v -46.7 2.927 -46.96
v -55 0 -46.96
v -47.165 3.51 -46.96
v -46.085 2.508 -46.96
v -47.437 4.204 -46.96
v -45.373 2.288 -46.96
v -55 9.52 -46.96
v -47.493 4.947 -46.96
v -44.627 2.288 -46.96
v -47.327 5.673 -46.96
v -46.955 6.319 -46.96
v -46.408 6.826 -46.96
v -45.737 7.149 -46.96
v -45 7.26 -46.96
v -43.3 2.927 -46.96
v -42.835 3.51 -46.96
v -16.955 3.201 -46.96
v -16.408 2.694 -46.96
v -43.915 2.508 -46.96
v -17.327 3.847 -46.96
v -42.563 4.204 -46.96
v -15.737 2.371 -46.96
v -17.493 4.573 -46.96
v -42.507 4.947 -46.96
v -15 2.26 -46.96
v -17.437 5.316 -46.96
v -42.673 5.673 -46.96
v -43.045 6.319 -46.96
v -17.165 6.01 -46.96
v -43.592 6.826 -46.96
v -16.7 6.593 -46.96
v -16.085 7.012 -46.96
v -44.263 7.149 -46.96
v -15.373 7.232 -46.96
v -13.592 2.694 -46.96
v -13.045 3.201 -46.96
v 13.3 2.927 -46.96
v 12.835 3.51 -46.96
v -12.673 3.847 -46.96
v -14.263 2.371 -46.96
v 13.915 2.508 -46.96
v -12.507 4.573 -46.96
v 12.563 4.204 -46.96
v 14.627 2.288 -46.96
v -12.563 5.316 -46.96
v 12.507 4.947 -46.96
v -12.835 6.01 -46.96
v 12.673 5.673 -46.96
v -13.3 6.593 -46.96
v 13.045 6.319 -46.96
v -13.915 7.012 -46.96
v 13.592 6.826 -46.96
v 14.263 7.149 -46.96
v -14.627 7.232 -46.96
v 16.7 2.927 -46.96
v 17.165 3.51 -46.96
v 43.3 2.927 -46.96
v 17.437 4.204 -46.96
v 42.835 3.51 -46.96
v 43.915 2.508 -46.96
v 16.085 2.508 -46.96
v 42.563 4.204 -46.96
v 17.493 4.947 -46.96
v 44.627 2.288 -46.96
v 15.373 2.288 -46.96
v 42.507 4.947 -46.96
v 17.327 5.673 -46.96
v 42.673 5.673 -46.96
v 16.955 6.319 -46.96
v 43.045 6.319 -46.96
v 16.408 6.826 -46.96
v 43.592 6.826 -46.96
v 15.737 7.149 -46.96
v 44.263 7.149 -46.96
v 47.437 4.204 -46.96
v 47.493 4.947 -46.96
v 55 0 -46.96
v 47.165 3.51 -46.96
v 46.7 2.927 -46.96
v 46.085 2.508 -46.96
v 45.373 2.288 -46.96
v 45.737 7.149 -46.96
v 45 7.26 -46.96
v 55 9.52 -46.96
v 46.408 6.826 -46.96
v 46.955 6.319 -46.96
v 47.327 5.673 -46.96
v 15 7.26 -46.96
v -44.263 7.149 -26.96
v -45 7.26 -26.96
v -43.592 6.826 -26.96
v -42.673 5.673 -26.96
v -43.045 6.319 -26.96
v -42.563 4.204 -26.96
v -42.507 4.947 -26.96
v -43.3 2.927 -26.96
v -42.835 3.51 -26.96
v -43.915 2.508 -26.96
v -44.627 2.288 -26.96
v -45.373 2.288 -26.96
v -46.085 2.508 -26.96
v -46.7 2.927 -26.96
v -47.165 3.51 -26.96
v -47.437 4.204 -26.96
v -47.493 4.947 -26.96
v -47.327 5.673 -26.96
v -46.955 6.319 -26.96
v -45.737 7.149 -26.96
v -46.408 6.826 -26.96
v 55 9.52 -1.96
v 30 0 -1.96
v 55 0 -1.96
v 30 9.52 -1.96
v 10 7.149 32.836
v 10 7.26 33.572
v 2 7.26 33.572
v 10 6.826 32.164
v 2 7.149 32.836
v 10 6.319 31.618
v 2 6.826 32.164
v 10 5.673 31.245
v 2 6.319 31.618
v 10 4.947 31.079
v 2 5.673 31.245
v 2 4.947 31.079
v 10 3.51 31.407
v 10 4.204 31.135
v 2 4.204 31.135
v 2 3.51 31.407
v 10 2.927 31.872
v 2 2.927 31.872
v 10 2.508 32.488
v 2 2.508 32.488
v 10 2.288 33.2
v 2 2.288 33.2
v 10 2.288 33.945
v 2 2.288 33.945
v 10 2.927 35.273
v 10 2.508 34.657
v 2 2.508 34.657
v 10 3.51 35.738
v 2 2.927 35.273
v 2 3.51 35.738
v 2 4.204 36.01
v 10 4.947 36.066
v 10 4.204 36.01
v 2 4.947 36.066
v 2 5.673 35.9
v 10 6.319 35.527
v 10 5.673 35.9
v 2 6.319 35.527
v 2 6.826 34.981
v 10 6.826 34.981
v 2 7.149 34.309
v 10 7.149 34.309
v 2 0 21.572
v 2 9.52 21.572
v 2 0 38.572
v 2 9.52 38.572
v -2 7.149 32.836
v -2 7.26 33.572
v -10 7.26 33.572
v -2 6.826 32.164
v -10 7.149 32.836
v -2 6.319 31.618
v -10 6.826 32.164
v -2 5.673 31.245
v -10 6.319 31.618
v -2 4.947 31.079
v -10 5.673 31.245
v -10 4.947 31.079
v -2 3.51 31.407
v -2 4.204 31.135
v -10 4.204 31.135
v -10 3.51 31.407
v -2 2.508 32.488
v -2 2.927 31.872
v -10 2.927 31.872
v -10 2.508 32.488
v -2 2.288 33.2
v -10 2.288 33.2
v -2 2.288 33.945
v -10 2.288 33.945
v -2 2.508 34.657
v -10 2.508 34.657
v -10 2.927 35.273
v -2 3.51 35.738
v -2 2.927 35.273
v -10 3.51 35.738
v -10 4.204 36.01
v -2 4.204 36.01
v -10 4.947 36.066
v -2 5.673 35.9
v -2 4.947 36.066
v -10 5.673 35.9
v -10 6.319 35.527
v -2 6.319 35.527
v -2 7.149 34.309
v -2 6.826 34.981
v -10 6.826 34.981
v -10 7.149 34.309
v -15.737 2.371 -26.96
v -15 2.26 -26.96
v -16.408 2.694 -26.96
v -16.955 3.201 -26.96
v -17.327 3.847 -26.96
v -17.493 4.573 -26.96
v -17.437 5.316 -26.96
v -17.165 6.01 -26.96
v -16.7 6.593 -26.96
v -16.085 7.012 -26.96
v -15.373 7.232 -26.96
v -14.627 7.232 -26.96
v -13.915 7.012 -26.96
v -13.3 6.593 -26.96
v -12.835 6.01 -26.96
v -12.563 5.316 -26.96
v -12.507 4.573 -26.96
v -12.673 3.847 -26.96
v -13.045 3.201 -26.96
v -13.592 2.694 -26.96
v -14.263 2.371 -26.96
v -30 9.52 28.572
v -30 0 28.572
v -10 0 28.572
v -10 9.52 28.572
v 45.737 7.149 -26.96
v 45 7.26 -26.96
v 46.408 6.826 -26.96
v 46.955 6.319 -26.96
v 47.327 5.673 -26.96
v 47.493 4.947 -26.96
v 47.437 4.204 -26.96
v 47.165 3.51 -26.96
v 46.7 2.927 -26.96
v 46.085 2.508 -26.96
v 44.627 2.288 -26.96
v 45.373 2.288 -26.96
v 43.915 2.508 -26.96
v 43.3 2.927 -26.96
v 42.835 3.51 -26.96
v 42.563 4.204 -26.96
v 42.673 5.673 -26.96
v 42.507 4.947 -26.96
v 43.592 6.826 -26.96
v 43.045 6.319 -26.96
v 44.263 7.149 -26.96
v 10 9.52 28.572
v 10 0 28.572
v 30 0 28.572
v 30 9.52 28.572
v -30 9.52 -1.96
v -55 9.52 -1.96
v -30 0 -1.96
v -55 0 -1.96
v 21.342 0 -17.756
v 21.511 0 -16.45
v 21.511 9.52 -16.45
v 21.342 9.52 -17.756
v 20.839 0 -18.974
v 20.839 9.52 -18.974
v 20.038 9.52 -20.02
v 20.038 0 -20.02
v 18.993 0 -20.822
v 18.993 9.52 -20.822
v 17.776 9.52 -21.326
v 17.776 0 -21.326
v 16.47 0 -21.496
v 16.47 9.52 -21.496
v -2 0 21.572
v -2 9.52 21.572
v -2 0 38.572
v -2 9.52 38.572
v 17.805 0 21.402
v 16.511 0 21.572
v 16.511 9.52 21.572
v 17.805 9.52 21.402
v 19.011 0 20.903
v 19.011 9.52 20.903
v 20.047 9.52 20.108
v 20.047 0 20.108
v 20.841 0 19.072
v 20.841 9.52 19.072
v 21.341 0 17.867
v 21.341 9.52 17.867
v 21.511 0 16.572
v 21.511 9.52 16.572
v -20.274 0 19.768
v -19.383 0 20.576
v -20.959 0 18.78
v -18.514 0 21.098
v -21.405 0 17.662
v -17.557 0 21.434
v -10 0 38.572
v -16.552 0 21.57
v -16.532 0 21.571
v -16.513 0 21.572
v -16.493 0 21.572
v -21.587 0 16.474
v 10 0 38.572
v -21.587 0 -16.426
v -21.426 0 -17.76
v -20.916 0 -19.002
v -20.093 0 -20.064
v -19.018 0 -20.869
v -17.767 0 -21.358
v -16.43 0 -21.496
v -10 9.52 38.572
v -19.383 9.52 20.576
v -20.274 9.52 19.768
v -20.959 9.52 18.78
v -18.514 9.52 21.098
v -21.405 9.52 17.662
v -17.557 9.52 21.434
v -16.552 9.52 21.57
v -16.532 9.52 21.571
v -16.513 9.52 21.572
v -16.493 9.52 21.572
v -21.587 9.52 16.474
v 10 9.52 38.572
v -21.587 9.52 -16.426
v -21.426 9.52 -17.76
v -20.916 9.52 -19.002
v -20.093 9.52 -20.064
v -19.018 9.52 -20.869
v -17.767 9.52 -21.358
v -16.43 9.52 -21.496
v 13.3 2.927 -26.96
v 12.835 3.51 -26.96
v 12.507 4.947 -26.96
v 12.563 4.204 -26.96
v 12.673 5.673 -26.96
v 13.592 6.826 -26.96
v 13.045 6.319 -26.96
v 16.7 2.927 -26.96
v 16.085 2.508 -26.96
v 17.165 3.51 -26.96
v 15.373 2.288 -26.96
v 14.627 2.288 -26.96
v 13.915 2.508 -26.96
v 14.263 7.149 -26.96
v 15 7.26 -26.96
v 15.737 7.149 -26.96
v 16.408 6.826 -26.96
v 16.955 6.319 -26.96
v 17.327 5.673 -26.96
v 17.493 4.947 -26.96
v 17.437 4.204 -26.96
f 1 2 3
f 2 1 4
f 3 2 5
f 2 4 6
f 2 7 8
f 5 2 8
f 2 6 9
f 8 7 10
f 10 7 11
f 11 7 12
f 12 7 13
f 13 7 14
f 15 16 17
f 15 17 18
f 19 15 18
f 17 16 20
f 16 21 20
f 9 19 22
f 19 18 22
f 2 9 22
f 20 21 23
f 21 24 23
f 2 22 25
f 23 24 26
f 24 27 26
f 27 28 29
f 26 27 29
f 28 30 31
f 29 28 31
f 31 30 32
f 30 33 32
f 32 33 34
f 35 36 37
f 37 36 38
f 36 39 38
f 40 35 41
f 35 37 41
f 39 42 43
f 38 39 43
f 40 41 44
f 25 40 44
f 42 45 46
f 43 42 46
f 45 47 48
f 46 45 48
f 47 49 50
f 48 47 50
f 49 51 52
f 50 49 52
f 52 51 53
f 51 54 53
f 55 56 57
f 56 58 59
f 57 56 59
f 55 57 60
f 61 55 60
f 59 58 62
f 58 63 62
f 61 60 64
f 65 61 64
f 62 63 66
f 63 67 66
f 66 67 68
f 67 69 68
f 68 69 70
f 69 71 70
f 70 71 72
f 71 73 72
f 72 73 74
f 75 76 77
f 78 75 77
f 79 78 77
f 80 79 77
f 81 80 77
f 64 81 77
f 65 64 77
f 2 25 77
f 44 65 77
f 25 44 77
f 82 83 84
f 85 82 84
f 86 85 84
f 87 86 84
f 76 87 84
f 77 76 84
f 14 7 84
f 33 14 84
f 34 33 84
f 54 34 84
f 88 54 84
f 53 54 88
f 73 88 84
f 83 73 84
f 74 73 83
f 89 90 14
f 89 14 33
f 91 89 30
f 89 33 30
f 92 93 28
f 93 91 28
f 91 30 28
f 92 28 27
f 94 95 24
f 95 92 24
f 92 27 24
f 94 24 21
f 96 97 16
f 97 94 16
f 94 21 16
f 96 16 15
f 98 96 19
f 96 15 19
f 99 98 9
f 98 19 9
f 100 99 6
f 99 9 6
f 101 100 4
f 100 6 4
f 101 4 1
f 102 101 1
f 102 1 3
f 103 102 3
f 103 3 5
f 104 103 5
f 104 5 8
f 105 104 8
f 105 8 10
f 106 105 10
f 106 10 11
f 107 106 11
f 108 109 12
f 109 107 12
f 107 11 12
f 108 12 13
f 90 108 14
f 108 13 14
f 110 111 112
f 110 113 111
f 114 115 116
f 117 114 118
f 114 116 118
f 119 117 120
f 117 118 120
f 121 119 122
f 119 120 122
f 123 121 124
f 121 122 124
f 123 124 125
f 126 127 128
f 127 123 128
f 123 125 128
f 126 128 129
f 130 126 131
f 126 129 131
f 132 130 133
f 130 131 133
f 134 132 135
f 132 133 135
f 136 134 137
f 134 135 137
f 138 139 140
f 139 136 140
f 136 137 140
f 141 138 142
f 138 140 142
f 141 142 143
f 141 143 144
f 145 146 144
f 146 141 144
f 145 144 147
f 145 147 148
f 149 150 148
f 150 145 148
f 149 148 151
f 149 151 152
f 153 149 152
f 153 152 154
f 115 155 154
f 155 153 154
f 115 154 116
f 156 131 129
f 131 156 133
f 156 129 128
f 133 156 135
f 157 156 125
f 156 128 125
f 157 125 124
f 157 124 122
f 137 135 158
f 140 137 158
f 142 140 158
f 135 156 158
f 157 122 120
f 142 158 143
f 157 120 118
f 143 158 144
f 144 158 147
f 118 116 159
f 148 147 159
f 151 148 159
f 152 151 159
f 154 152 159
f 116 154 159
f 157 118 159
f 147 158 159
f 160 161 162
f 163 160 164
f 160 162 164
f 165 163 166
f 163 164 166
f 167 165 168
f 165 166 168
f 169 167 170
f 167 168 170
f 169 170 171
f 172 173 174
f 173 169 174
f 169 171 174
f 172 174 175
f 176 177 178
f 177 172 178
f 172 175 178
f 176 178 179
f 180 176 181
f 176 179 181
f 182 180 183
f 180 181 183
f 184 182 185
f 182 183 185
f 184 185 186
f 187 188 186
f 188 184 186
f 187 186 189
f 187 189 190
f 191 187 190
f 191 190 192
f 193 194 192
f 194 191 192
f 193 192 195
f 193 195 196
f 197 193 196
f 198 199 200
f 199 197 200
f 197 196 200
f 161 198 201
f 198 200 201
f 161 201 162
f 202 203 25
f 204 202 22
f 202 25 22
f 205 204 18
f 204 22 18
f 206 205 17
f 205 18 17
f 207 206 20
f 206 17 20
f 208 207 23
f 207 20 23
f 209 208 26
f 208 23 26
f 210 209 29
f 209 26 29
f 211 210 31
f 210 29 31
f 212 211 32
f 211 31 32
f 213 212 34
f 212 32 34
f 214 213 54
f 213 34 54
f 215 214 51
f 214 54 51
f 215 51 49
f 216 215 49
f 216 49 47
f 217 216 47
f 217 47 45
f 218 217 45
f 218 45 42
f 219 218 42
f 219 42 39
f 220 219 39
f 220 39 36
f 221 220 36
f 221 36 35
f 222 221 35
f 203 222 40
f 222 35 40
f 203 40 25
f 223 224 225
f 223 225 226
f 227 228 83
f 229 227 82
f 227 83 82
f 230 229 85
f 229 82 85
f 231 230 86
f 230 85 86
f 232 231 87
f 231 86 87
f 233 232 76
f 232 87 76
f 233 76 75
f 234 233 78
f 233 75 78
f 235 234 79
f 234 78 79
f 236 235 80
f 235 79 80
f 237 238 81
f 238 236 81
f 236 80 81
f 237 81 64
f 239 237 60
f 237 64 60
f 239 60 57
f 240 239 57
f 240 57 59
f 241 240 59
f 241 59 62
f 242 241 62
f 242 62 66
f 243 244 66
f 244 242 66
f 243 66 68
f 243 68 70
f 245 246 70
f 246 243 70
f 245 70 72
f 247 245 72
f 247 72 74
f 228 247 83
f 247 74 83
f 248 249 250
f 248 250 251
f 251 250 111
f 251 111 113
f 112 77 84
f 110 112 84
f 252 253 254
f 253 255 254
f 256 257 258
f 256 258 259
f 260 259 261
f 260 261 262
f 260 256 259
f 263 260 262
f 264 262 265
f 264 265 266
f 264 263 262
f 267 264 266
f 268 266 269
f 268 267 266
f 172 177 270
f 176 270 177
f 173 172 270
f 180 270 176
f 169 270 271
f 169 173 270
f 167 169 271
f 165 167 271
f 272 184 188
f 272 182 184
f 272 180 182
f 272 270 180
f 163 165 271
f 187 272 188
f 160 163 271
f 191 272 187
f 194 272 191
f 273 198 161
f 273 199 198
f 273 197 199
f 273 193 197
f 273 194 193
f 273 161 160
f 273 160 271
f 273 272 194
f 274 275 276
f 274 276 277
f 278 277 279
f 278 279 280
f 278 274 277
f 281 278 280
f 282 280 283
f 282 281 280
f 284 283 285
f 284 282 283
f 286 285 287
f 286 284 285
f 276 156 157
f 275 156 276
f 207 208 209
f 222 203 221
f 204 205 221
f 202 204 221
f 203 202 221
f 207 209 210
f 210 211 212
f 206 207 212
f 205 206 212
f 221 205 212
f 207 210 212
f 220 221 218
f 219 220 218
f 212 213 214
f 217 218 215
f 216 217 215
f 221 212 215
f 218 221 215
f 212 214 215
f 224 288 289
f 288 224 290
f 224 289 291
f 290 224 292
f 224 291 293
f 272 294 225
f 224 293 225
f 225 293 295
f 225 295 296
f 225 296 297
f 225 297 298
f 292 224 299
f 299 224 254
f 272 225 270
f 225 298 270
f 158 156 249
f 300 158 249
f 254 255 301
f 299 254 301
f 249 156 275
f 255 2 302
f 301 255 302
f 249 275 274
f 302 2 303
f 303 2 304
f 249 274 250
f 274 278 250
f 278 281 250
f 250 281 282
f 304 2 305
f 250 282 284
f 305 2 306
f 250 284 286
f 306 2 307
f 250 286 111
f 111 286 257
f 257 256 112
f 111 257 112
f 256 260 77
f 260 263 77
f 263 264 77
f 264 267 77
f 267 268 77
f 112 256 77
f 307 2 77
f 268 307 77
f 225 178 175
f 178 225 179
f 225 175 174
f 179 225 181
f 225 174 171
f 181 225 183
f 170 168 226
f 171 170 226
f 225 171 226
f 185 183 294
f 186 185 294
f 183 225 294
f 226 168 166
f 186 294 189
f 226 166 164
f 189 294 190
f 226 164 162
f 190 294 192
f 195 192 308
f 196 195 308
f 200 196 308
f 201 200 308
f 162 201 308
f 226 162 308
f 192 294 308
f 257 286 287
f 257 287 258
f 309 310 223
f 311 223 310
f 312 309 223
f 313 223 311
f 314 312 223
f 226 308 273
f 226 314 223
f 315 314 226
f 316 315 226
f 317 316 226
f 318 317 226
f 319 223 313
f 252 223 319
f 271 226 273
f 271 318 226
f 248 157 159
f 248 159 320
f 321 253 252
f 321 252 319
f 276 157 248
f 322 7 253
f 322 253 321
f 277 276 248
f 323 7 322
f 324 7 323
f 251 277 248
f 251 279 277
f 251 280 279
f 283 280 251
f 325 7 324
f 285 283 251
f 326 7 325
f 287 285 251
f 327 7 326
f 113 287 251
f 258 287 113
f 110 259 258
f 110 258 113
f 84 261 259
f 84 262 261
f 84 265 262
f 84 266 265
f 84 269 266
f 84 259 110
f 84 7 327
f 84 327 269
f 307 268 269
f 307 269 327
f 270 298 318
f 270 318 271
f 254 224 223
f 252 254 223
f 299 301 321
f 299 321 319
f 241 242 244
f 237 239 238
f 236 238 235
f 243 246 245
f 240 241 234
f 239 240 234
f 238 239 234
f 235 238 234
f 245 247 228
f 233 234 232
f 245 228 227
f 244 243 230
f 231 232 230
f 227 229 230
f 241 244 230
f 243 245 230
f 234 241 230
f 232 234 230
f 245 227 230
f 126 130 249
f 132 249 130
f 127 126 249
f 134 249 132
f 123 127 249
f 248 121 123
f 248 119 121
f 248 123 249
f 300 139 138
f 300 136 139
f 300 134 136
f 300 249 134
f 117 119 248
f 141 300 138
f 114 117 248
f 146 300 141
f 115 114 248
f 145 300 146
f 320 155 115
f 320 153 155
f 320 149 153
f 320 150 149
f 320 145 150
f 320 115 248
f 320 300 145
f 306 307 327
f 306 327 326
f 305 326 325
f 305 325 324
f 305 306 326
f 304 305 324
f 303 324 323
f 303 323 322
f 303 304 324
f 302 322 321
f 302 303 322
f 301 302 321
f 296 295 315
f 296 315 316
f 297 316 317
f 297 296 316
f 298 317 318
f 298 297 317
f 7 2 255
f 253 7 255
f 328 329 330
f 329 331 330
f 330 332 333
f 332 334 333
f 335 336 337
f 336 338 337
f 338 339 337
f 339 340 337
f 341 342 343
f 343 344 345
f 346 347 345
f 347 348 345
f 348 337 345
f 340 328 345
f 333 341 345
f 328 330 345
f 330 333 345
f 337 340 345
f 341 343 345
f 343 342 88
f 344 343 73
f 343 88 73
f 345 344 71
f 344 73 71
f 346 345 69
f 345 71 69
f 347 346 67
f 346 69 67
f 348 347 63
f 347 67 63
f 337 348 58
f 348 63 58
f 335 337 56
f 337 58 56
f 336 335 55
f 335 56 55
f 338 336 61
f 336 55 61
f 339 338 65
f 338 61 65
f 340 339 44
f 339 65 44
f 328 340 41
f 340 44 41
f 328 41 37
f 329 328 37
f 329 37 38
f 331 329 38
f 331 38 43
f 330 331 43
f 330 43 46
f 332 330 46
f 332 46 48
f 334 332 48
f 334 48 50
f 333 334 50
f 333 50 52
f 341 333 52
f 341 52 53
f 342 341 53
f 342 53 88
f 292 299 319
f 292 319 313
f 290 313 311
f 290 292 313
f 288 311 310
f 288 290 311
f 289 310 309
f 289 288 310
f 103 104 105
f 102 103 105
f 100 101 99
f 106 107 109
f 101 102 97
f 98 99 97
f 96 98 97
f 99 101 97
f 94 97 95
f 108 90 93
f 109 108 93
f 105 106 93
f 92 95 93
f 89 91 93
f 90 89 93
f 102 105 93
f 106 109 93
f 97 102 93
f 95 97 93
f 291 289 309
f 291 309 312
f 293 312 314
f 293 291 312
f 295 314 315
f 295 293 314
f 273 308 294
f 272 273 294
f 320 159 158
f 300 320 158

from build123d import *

# Parameters (mm, degrees)
ESBO_O1_W                    = 60
ESBO_O1_H                    = 50
RESSALTO_EXTRUS_O1_DEPTH     = 9.52
CORTE_EXTRUS_O1_DEPTH        = 9.52
CORTE_EXTRUS_O1_START        = 7.26
CORTE_EXTRUS_O1_2_DEPTH      = 2.26
CORTE_EXTRUS_O1_3_DEPTH      = 2.2599999
CORTE_EXTRUS_O1_START_2      = -30
CORTE_EXTRUS_O1_4_OUTLINE_W  = 5.0000001
CORTE_EXTRUS_O1_4_OUTLINE_H  = 3.572491942
CORTE_EXTRUS_O1_4_DEPTH      = 28
CORTE_EXTRUS_O1_START_3      = 2
CORTE_EXTRUS_O1_5_OUTLINE_W  = 5.0000001
CORTE_EXTRUS_O1_5_OUTLINE_H  = 3.572491942
CORTE_EXTRUS_O1_5_DEPTH      = 28
CORTE_EXTRUS_O1_START_4      = -10
CORTE_EXTRUS_O1_6_DEPTH      = 8
CORTE_EXTRUS_O1_7_DEPTH      = 8
CORTE_EXTRUS_O1_START_5      = -46.96
CORTE_EXTRUS_O1_8_DEPTH      = 21.96
CORTE_EXTRUS_O1_START_6      = -26.96
CORTE_EXTRUS_O1_9_OUTLINE_W  = 25
CORTE_EXTRUS_O1_9_OUTLINE_H  = 5.0000001
CORTE_EXTRUS_O1_9_DEPTH      = 25
CORTE_EXTRUS_O1_10_OUTLINE_R = 2.5
CORTE_EXTRUS_O1_10_DEPTH     = 1.96


with BuildPart() as part:
    # Esboço1 → Ressalto-extrusão1 (new body)
    with BuildSketch(Plane(origin=(0, 0, 0), x_dir=(1, 0, 0), z_dir=(0, 1, 0))):
        Rectangle(ESBO_O1_W, ESBO_O1_H)
    extrude(amount=RESSALTO_EXTRUS_O1_DEPTH)

    # Corte-extrusão1: read off the stored shape, not the designer's step
    # Corte-extrusão1 outline → Corte-extrusão1 (cut)
    with BuildSketch(Plane(origin=(0, 0, 0), x_dir=(1, 0, 0), z_dir=(0, 1, 0))):
        with BuildLine():
            ThreePointArc((-16.551848481, -21.569831255), (-16.522584074, -21.571242343), (-16.493312326, -21.572491942))
            Line((-16.493312326, -21.572491942), (-2, -21.572491942))
            Line((-2, -21.572491942), (-2, -25))
            Line((-2, -25), (2, -25))
            Line((2, -25), (2, -21.572491942))
            Line((2, -21.572491942), (16.511245971, -21.572491942))
            ThreePointArc((16.511245971, -21.572491942), (20.046779877, -20.108025848), (21.511245971, -16.572491942))
            Line((21.511245971, -16.572491942), (21.511245971, 16.45))
            ThreePointArc((21.511245971, 16.45), (20.037938418, 20.019740143), (16.469538401, 21.496290566))
            Line((16.469538401, 21.496290566), (-16.430461599, 21.496290566))
            ThreePointArc((-16.430461599, 21.496290566), (-20.093320705, 20.064258273), (-21.587468917, 16.426295322))
            Line((-21.587468917, 16.426295322), (-21.587468917, -16.473704678))
            ThreePointArc((-21.587468917, -16.473704678), (-20.959260779, -18.779602466), (-19.383464148, -20.576453893))
            ThreePointArc((-19.383464148, -20.576453893), (-18.043937425, -21.290581379), (-16.551848481, -21.569831255))
        make_face()
    extrude(amount=CORTE_EXTRUS_O1_DEPTH, mode=Mode.SUBTRACT)

    # Corte-extrus_o1 2 outline → Corte-extrus_o1 2 (add)
    with BuildSketch(Plane(origin=(0, 0, 0), x_dir=(1, 0, 0), z_dir=(0, 1, 0)).offset(CORTE_EXTRUS_O1_START)):
        Polygon((-2, -38.572491942), (-2, -25), (-30, -25), (-30, -28.572491942), (-10, -28.572491942), (-10, -38.572491942), align=None)
        Polygon((30, -25), (2, -25), (2, -38.572491942), (10, -38.572491942), (10, -28.572491942), (30, -28.572491942), align=None)
        Polygon((-55, 1.96), (-30, 1.96), (-30, 25), (30, 25), (30, 1.96), (55, 1.96), (55, 46.96), (-55, 46.96), align=None)
    extrude(amount=CORTE_EXTRUS_O1_2_DEPTH)

    # Corte-extrus_o1 3 outline → Corte-extrus_o1 3 (add)
    with BuildSketch(Plane(origin=(0, 0, 0), x_dir=(1, 0, 0), z_dir=(0, 1, 0))):
        Polygon((-2, -38.572491942), (-2, -25), (-30, -25), (-30, -28.572491942), (-10, -28.572491942), (-10, -38.572491942), align=None)
        Polygon((30, -25), (2, -25), (2, -38.572491942), (10, -38.572491942), (10, -28.572491942), (30, -28.572491942), align=None)
        Polygon((-55, 1.96), (-30, 1.96), (-30, 25), (30, 25), (30, 1.96), (55, 1.96), (55, 46.96), (-55, 46.96), align=None)
    extrude(amount=CORTE_EXTRUS_O1_3_DEPTH)

    # Corte-extrus_o1 4 outline → Corte-extrus_o1 4 (add)
    with BuildSketch(Plane.YZ.offset(CORTE_EXTRUS_O1_START_2)):
        with Locations((4.75999995, 26.786245971)):
            Rectangle(CORTE_EXTRUS_O1_4_OUTLINE_W, CORTE_EXTRUS_O1_4_OUTLINE_H)
    extrude(amount=CORTE_EXTRUS_O1_4_DEPTH)

    # Corte-extrus_o1 5 outline → Corte-extrus_o1 5 (add)
    with BuildSketch(Plane.YZ.offset(CORTE_EXTRUS_O1_START_3)):
        with Locations((4.75999995, 26.786245971)):
            Rectangle(CORTE_EXTRUS_O1_5_OUTLINE_W, CORTE_EXTRUS_O1_5_OUTLINE_H)
    extrude(amount=CORTE_EXTRUS_O1_5_DEPTH)

    # Corte-extrus_o1 6 outline → Corte-extrus_o1 6 (add)
    with BuildSketch(Plane.YZ.offset(CORTE_EXTRUS_O1_START_4)):
        with BuildLine():
            Line((7.26, 28.572491942), (7.26, 33.572491942))
            ThreePointArc((7.26, 33.572491942), (4.76, 31.072491942), (2.26, 33.572491942))
            Line((2.26, 33.572491942), (2.2599999, 28.572491942))
            Line((2.2599999, 28.572491942), (7.26, 28.572491942))
        make_face()
        with BuildLine():
            ThreePointArc((2.26, 33.572491942), (4.76, 36.072491942), (7.26, 33.572491942))
            Line((7.26, 33.572491942), (7.26, 38.572491942))
            Line((7.26, 38.572491942), (2.2599999, 38.572491942))
            Line((2.2599999, 38.572491942), (2.26, 33.572491942))
        make_face()
    extrude(amount=CORTE_EXTRUS_O1_6_DEPTH)

    # Corte-extrus_o1 7 outline → Corte-extrus_o1 7 (add)
    with BuildSketch(Plane.YZ.offset(CORTE_EXTRUS_O1_START_3)):
        with BuildLine():
            Line((7.26, 28.572491942), (7.26, 33.572491942))
            ThreePointArc((7.26, 33.572491942), (4.76, 31.072491942), (2.26, 33.572491942))
            Line((2.26, 33.572491942), (2.2599999, 28.572491942))
            Line((2.2599999, 28.572491942), (7.26, 28.572491942))
        make_face()
        with BuildLine():
            ThreePointArc((2.26, 33.572491942), (4.76, 36.072491942), (7.26, 33.572491942))
            Line((7.26, 33.572491942), (7.26, 38.572491942))
            Line((7.26, 38.572491942), (2.2599999, 38.572491942))
            Line((2.2599999, 38.572491942), (2.26, 33.572491942))
        make_face()
    extrude(amount=CORTE_EXTRUS_O1_7_DEPTH)

    # Corte-extrus_o1 8 outline → Corte-extrus_o1 8 (add)
    with BuildSketch(Plane.XY.offset(CORTE_EXTRUS_O1_START_5)):
        with BuildLine():
            ThreePointArc((45, 7.26), (47.5, 4.76), (45, 2.26))
            Line((45, 2.26), (55, 2.2599999))
            Line((55, 2.2599999), (55, 7.26))
            Line((55, 7.26), (45, 7.26))
        make_face()
        with BuildLine():
            ThreePointArc((45, 2.26), (42.5, 4.76), (45, 7.26))
            Line((45, 7.26), (15.000000025, 7.26))
            ThreePointArc((15.000000025, 7.26), (17.5, 4.759999988), (15.000000001, 2.26))
            Line((15.000000001, 2.26), (45, 2.26))
        make_face()
        with BuildLine():
            ThreePointArc((15.000000001, 2.26), (12.5, 4.760000012), (15.000000025, 7.26))
            Line((15.000000025, 7.26), (-15.000000034, 7.26))
            ThreePointArc((-15.000000034, 7.26), (-12.5, 4.760000017), (-15, 2.26))
            Line((-15, 2.26), (15.000000001, 2.26))
        make_face()
        with BuildLine():
            ThreePointArc((-15, 2.26), (-17.5, 4.759999983), (-15.000000034, 7.26))
            Line((-15.000000034, 7.26), (-44.999999984, 7.26))
            ThreePointArc((-44.999999984, 7.26), (-42.5, 4.759999992), (-45, 2.26))
            Line((-45, 2.26), (-15, 2.26))
        make_face()
        with BuildLine():
            ThreePointArc((-45, 2.26), (-47.5, 4.760000008), (-44.999999984, 7.26))
            Line((-44.999999984, 7.26), (-55, 7.26))
            Line((-55, 7.26), (-55, 2.2599999))
            Line((-55, 2.2599999), (-45, 2.26))
        make_face()
    extrude(amount=CORTE_EXTRUS_O1_8_DEPTH)

    # Corte-extrus_o1 9 outline → Corte-extrus_o1 9 (add)
    with BuildSketch(Plane.XY.offset(CORTE_EXTRUS_O1_START_6)):
        with Locations((42.5, 4.75999995)):
            Rectangle(CORTE_EXTRUS_O1_9_OUTLINE_W, CORTE_EXTRUS_O1_9_OUTLINE_H)
        with Locations((-42.5, 4.75999995)):
            Rectangle(CORTE_EXTRUS_O1_9_OUTLINE_W, CORTE_EXTRUS_O1_9_OUTLINE_H)
    extrude(amount=CORTE_EXTRUS_O1_9_DEPTH)

    # Corte-extrus_o1 10 outline → Corte-extrus_o1 10 (add)
    with BuildSketch(Plane.XY.offset(CORTE_EXTRUS_O1_START_6)):
        with Locations((15, 4.76)):
            Circle(CORTE_EXTRUS_O1_10_OUTLINE_R)
        with Locations((-15, 4.76)):
            Circle(CORTE_EXTRUS_O1_10_OUTLINE_R)
    extrude(amount=CORTE_EXTRUS_O1_10_DEPTH)


solid = part.part
